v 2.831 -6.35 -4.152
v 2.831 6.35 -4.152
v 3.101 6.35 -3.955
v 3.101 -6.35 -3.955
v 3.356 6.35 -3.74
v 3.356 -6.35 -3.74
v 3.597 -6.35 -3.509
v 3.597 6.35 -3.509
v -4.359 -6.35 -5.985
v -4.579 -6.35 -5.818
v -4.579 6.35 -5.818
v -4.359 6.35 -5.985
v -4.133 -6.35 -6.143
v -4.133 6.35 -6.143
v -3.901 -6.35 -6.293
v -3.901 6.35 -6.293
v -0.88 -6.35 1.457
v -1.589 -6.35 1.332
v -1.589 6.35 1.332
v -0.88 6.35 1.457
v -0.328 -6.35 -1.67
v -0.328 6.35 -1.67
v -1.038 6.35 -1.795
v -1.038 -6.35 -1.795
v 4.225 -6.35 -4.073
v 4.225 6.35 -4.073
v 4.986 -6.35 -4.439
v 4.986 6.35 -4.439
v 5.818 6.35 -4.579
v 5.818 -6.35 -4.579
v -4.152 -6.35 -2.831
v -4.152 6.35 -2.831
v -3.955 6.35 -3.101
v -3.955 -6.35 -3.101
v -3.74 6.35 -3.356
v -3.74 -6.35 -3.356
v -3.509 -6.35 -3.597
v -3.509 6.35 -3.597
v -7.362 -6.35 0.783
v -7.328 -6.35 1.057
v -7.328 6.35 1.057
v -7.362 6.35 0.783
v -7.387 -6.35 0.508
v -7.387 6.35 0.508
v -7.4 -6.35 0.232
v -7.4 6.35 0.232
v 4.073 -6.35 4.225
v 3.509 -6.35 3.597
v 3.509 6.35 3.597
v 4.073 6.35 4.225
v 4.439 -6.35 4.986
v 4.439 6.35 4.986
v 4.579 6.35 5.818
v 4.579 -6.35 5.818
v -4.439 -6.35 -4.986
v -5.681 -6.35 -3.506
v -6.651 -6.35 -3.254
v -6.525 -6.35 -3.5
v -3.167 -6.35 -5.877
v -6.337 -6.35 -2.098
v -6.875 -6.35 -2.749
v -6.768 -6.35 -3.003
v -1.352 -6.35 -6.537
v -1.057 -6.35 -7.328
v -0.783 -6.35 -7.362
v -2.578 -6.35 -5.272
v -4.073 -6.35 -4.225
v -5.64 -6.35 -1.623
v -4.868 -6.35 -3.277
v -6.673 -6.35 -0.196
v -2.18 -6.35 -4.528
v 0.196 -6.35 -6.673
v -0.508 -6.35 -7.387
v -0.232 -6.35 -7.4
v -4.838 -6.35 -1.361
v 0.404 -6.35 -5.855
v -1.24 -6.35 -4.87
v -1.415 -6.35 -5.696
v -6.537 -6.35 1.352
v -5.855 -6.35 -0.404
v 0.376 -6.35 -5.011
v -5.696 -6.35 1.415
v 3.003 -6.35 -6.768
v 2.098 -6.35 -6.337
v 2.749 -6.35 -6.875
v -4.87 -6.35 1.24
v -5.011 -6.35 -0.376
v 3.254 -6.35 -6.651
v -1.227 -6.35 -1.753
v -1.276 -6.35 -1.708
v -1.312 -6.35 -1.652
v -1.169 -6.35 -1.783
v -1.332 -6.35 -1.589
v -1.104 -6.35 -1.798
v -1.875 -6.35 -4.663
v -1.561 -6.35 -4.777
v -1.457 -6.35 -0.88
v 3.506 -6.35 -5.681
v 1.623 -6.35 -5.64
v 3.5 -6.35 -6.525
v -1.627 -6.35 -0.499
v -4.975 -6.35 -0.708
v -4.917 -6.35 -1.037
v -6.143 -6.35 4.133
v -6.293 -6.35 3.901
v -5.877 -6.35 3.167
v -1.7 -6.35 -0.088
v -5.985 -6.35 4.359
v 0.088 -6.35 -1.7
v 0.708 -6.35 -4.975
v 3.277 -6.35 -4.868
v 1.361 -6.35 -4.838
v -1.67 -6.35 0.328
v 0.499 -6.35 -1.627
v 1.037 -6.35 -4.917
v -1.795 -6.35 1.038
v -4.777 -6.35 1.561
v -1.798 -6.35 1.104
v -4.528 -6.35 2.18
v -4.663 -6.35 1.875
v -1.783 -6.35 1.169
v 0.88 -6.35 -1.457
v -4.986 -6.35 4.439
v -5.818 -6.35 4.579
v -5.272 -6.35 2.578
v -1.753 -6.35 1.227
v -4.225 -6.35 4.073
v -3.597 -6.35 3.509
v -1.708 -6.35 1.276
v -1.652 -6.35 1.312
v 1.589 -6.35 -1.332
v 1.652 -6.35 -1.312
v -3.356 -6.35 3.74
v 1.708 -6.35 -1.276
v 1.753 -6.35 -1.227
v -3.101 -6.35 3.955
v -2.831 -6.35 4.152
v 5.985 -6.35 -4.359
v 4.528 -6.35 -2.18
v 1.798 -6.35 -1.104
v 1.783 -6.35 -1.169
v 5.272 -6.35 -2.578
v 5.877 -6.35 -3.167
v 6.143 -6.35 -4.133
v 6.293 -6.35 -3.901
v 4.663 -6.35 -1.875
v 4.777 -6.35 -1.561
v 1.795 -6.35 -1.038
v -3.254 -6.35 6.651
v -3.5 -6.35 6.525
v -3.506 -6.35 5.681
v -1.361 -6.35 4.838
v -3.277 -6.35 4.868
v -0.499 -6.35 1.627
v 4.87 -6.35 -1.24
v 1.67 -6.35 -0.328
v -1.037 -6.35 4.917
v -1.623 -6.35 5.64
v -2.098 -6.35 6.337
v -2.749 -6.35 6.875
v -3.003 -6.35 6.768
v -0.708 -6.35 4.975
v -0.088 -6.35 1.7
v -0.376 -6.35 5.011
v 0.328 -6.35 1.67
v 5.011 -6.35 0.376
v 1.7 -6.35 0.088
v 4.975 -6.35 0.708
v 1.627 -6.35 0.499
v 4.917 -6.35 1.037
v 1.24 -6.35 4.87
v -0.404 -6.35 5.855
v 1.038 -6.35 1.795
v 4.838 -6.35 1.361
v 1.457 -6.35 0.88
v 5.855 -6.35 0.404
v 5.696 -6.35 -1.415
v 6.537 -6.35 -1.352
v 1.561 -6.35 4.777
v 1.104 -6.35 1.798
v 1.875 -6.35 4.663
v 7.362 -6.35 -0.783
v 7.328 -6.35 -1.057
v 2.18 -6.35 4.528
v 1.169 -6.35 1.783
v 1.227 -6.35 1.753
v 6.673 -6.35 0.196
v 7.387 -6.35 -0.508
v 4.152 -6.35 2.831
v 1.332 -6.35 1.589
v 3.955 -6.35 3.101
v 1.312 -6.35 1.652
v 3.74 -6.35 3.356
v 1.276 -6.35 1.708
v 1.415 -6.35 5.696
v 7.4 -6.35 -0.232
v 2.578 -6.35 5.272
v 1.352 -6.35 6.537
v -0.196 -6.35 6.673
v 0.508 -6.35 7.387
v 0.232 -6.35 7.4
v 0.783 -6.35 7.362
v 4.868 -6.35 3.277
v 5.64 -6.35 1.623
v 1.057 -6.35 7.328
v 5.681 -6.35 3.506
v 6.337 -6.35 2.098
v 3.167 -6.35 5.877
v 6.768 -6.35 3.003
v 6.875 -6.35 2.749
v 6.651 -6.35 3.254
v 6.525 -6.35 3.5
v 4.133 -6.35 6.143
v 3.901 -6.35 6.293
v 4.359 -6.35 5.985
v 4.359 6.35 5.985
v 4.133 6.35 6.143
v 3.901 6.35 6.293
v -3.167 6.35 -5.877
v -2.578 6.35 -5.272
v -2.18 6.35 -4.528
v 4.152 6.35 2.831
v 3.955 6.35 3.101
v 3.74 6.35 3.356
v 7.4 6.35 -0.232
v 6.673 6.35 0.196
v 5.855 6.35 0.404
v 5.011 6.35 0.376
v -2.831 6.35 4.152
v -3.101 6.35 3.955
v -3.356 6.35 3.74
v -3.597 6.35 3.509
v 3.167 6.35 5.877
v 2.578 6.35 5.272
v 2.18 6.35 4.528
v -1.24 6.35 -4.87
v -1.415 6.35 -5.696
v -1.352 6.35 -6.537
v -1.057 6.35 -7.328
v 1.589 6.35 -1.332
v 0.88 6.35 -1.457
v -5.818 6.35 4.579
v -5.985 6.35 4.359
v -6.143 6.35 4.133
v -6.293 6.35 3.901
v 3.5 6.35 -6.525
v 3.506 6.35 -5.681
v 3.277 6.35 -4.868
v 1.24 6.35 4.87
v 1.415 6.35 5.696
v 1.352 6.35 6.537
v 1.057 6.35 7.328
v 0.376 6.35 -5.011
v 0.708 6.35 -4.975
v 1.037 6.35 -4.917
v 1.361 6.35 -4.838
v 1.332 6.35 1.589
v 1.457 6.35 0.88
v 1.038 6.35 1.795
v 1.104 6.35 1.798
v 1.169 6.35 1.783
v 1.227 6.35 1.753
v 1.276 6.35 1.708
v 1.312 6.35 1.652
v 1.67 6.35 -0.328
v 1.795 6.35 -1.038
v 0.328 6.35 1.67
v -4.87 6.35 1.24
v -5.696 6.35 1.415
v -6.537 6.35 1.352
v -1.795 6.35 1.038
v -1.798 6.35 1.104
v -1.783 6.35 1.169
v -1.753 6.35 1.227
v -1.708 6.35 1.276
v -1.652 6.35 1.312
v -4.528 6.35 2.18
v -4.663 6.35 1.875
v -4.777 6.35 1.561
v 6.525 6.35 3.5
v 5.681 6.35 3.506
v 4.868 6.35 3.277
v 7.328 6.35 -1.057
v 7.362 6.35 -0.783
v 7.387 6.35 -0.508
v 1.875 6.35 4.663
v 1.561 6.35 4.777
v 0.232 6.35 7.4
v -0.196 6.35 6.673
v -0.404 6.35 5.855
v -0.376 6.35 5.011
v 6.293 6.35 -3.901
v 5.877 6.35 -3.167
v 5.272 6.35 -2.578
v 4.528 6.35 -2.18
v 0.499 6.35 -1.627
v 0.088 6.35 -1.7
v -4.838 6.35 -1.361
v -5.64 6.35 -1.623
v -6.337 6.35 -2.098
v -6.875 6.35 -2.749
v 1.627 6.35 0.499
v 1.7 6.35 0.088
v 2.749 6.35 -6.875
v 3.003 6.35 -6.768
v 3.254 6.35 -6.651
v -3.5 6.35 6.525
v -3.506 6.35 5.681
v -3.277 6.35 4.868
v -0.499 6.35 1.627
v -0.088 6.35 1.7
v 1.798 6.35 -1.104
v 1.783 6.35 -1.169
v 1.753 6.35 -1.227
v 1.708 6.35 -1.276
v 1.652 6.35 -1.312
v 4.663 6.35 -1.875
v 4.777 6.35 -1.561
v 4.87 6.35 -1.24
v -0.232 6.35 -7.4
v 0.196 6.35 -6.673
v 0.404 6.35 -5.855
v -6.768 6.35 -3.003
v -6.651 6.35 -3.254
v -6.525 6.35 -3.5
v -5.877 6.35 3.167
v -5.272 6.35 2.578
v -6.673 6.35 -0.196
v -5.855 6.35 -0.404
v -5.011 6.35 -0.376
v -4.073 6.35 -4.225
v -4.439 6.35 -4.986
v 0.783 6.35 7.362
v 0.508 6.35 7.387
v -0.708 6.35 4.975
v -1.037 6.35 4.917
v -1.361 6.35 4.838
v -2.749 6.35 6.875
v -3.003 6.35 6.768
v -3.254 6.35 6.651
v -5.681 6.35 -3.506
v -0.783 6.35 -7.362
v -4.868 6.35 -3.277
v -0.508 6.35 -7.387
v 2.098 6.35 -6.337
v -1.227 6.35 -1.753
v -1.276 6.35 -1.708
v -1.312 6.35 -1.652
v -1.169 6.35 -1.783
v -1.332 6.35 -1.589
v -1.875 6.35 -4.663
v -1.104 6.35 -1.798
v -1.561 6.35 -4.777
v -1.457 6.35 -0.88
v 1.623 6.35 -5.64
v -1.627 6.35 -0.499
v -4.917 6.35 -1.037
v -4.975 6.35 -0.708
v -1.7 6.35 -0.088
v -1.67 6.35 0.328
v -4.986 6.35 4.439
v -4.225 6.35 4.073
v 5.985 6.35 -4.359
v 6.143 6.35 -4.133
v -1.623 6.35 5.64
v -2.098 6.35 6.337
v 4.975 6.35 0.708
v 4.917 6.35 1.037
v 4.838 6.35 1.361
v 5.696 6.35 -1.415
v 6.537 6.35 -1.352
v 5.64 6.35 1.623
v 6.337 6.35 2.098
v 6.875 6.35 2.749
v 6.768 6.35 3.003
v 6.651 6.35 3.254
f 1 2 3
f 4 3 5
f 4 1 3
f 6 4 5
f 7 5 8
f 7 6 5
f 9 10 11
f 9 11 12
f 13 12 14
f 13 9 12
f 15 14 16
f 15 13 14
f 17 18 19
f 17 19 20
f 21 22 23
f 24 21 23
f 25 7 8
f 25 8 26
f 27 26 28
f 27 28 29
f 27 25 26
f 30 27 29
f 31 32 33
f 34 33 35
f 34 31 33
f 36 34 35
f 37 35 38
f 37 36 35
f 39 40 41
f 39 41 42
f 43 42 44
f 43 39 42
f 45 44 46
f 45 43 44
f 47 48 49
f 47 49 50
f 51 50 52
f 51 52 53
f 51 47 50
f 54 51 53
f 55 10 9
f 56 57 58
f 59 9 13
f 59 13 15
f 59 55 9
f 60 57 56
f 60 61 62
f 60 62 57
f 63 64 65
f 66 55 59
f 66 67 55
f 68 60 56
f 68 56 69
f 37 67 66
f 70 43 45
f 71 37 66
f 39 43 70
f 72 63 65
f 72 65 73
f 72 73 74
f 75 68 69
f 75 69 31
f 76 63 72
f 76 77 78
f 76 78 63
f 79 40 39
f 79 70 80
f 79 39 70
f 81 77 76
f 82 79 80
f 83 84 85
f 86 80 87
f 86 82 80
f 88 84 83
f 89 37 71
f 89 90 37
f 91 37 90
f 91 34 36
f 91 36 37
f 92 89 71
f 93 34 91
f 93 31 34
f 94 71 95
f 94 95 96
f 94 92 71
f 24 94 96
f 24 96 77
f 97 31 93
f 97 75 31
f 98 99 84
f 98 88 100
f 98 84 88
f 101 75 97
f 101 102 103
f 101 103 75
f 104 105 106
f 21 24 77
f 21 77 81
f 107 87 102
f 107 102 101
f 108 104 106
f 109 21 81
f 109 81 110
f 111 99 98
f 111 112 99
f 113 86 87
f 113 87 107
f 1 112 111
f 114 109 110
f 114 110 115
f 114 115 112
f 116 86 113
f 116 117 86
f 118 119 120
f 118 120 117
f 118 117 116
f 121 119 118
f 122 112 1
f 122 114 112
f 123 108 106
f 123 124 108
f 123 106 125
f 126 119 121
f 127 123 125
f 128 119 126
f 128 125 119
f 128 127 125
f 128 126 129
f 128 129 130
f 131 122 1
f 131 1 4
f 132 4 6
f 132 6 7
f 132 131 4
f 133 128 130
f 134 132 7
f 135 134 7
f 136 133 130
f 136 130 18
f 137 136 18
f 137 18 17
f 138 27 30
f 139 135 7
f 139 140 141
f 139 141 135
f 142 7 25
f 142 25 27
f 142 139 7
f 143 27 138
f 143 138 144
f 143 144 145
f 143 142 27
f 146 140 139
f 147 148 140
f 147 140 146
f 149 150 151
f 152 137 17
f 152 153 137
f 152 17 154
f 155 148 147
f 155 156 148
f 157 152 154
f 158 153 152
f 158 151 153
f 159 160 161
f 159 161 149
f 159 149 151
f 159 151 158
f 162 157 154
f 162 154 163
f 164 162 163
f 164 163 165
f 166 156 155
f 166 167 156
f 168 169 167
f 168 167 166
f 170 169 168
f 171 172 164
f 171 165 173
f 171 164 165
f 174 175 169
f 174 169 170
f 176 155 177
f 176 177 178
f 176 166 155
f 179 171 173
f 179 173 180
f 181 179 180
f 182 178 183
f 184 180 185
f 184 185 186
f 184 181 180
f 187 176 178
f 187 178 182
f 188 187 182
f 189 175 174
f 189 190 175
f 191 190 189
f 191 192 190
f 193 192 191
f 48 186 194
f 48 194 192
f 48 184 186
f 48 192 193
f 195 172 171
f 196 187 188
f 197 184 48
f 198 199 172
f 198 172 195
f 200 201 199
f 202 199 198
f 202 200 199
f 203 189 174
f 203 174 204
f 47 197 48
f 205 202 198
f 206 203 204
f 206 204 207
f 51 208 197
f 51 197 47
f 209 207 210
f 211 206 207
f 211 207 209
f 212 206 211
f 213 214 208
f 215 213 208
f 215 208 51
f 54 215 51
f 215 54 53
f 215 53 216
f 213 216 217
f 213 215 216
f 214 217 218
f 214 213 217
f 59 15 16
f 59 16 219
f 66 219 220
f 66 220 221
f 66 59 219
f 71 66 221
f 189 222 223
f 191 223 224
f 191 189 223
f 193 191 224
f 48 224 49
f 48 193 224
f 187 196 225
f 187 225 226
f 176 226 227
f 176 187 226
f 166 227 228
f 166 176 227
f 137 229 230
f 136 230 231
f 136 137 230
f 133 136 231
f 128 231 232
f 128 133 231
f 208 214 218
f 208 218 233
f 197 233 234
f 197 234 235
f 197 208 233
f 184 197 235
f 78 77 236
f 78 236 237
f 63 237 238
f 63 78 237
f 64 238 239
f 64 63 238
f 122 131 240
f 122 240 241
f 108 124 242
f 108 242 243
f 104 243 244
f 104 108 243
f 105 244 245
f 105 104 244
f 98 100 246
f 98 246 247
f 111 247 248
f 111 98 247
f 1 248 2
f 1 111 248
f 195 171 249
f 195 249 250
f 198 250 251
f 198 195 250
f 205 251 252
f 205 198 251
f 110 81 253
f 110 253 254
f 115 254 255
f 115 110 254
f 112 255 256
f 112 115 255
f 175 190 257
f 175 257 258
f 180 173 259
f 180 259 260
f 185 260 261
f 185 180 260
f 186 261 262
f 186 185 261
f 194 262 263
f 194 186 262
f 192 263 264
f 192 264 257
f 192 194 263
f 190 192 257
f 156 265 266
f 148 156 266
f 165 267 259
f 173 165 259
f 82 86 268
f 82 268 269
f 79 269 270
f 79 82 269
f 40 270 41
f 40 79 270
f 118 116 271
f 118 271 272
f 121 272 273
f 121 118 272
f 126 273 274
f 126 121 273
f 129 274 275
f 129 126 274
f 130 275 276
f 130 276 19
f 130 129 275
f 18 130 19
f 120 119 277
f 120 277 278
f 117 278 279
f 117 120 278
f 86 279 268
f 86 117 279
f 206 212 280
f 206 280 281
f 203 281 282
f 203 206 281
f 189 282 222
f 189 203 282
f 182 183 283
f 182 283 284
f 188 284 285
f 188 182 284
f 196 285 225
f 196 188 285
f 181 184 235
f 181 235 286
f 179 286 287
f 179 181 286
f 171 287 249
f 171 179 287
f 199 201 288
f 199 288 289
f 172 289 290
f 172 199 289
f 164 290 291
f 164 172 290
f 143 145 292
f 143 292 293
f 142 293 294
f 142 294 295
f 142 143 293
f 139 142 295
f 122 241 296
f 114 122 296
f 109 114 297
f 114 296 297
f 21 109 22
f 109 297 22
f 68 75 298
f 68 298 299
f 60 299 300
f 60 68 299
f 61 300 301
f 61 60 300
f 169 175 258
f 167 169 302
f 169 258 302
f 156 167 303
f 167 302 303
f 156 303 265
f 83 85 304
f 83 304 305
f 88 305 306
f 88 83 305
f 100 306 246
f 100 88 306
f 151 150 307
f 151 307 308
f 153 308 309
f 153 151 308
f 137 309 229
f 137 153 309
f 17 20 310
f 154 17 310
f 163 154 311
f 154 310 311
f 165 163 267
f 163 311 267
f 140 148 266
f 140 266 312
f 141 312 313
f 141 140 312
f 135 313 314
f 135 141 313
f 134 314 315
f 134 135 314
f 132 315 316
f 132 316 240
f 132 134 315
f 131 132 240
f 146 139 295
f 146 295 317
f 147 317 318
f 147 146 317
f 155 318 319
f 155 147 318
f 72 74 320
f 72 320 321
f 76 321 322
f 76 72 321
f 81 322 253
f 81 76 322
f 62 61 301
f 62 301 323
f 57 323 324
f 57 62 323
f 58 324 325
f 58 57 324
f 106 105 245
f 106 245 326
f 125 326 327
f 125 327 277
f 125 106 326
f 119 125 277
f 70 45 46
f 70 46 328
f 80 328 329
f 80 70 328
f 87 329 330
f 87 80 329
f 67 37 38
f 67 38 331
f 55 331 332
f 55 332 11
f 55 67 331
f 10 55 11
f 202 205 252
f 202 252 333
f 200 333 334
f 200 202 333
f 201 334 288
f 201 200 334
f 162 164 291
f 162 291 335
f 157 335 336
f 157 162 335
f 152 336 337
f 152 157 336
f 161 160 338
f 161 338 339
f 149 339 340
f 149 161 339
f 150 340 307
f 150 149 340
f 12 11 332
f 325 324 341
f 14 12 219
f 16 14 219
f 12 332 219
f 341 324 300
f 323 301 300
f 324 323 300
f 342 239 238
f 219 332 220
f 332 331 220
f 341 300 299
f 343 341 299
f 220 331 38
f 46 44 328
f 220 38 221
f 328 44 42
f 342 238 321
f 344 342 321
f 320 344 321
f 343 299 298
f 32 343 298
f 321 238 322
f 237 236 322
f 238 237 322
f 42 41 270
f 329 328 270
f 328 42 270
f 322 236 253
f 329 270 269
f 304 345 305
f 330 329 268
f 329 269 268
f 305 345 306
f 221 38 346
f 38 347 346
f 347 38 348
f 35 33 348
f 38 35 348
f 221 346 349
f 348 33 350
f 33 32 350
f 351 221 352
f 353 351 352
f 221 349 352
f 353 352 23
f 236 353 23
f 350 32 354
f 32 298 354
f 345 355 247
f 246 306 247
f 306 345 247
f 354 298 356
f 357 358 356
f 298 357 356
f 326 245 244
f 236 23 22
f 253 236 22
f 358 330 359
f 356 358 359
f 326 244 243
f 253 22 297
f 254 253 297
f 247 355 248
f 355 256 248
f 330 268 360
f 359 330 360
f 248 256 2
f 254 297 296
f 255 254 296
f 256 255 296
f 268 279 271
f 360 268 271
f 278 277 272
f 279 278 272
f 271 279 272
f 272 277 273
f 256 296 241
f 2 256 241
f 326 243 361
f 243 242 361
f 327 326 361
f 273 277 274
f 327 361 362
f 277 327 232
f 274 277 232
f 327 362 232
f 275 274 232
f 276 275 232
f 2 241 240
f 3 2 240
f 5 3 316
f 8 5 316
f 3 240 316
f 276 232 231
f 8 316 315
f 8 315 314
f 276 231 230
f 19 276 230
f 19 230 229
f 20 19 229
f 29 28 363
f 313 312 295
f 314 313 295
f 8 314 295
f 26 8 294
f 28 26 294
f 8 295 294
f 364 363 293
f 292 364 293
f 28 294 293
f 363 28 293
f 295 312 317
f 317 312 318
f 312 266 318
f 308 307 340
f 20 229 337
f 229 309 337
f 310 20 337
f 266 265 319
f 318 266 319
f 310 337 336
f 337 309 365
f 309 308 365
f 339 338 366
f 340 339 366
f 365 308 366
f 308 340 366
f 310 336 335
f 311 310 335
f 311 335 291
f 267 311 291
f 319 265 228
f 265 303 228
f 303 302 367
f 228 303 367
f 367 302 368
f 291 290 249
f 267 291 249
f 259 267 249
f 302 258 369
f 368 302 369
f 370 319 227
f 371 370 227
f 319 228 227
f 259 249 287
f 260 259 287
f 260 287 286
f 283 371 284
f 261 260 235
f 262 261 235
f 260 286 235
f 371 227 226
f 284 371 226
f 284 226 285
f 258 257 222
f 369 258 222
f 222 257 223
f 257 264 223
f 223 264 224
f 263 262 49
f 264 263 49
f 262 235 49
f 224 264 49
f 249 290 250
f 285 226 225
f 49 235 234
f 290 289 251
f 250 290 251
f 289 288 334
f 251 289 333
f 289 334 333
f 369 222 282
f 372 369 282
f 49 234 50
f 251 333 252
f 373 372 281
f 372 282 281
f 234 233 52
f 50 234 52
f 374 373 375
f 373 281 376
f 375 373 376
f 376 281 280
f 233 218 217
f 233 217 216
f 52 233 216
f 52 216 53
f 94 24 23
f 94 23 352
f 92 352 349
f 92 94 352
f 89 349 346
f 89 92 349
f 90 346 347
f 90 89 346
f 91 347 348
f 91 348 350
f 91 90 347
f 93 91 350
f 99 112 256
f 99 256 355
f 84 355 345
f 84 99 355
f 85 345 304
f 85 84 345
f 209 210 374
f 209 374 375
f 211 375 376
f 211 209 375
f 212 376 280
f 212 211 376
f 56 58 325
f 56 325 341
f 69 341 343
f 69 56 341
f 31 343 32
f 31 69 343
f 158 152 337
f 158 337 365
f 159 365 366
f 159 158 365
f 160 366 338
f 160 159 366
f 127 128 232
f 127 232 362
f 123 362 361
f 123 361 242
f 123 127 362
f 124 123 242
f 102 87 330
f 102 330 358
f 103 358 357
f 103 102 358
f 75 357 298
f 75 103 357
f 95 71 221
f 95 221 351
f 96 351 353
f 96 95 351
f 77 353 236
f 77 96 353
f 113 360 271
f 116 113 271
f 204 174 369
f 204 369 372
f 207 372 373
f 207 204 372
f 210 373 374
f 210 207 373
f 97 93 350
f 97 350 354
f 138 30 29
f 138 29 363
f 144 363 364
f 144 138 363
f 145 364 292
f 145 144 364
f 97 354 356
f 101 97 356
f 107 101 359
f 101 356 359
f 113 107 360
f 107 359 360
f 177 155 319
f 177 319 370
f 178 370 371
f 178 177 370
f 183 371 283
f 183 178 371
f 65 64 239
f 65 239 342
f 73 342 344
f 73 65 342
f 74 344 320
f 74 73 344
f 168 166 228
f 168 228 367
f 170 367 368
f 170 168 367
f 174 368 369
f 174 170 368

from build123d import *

# Parameters (mm, degrees)
BOSS_EXTRUDE1_DEPTH = 12.7
SKETCH2_R           = 1.7018
CUT_EXTRUDE1_DEPTH  = 56.896


with BuildPart() as part:
    # Sketch1 → Boss-Extrude1 (new body)
    with BuildSketch(Plane.XZ.offset(6.35)):
        with BuildLine():
            ThreePointArc((3.900741532, 6.293125734), (2.850773823, 5.595435975), (2.180140266, 4.527983952))
            ThreePointArc((2.180140266, 4.527983952), (1.71882223, 4.722425266), (1.240447645, 4.870004095))
            ThreePointArc((1.240447645, 4.870004095), (1.41285747, 6.118794727), (1.057001873, 7.328162323))
            ThreePointArc((1.057001873, 7.328162323), (0.645301119, 7.375825545), (0.231578393, 7.400377521))
            ThreePointArc((0.231578393, 7.400377521), (-0.328875436, 6.271176611), (-0.375935122, 5.011419263))
            ThreePointArc((-0.375935122, 5.011419263), (-0.872668917, 4.949151363), (-1.360742875, 4.837771086))
            ThreePointArc((-1.360742875, 4.837771086), (-1.835826903, 6.005460409), (-2.748690687, 6.874875672))
            ThreePointArc((-2.748690687, 6.874875672), (-3.12906561, 6.710302855), (-3.499635989, 6.524704127))
            ThreePointArc((-3.499635989, 6.524704127), (-3.420402788, 5.266560539), (-2.831278997, 4.15204883))
            ThreePointArc((-2.831278997, 4.15204883), (-3.230329132, 3.849756349), (-3.597323441, 3.509261221))
            ThreePointArc((-3.597323441, 3.509261221), (-4.592602939, 4.282967824), (-5.817873798, 4.579471636))
            ThreePointArc((-5.817873798, 4.579471636), (-6.065001736, 4.246759935), (-6.293125734, 3.900741532))
            ThreePointArc((-6.293125734, 3.900741532), (-5.595435975, 2.850773823), (-4.527983952, 2.180140266))
            ThreePointArc((-4.527983952, 2.180140266), (-4.722425266, 1.71882223), (-4.870004095, 1.240447645))
            ThreePointArc((-4.870004095, 1.240447645), (-6.118794727, 1.41285747), (-7.328162323, 1.057001873))
            ThreePointArc((-7.328162323, 1.057001873), (-7.375825545, 0.645301119), (-7.400377521, 0.231578393))
            ThreePointArc((-7.400377521, 0.231578393), (-6.271176611, -0.328875436), (-5.011419263, -0.375935122))
            ThreePointArc((-5.011419263, -0.375935122), (-4.949151363, -0.872668917), (-4.837771086, -1.360742875))
            ThreePointArc((-4.837771086, -1.360742875), (-6.005460409, -1.835826903), (-6.874875672, -2.748690687))
            ThreePointArc((-6.874875672, -2.748690687), (-6.710302855, -3.12906561), (-6.524704127, -3.499635989))
            ThreePointArc((-6.524704127, -3.499635989), (-5.266560539, -3.420402788), (-4.15204883, -2.831278997))
            ThreePointArc((-4.15204883, -2.831278997), (-3.849756349, -3.230329132), (-3.509261221, -3.597323441))
            ThreePointArc((-3.509261221, -3.597323441), (-4.282967824, -4.592602939), (-4.579471636, -5.817873798))
            ThreePointArc((-4.579471636, -5.817873798), (-4.246759935, -6.065001736), (-3.900741532, -6.293125734))
            ThreePointArc((-3.900741532, -6.293125734), (-2.850773823, -5.595435975), (-2.180140266, -4.527983952))
            ThreePointArc((-2.180140266, -4.527983952), (-1.71882223, -4.722425266), (-1.240447645, -4.870004095))
            ThreePointArc((-1.240447645, -4.870004095), (-1.41285747, -6.118794727), (-1.057001873, -7.328162323))
            ThreePointArc((-1.057001873, -7.328162323), (-0.645301119, -7.375825545), (-0.231578393, -7.400377521))
            ThreePointArc((-0.231578393, -7.400377521), (0.328875436, -6.271176611), (0.375935122, -5.011419263))
            ThreePointArc((0.375935122, -5.011419263), (0.872668917, -4.949151363), (1.360742875, -4.837771086))
            ThreePointArc((1.360742875, -4.837771086), (1.835826903, -6.005460409), (2.748690687, -6.874875672))
            ThreePointArc((2.748690687, -6.874875672), (3.12906561, -6.710302855), (3.499635989, -6.524704127))
            ThreePointArc((3.499635989, -6.524704127), (3.420402788, -5.266560539), (2.831278997, -4.15204883))
            ThreePointArc((2.831278997, -4.15204883), (3.230329132, -3.849756349), (3.597323441, -3.509261221))
            ThreePointArc((3.597323441, -3.509261221), (4.592602939, -4.282967824), (5.817873798, -4.579471636))
            ThreePointArc((5.817873798, -4.579471636), (6.065001736, -4.246759935), (6.293125734, -3.900741532))
            ThreePointArc((6.293125734, -3.900741532), (5.595435975, -2.850773823), (4.527983952, -2.180140266))
            ThreePointArc((4.527983952, -2.180140266), (4.722425266, -1.71882223), (4.870004095, -1.240447645))
            ThreePointArc((4.870004095, -1.240447645), (6.118794727, -1.41285747), (7.328162323, -1.057001873))
            ThreePointArc((7.328162323, -1.057001873), (7.375825545, -0.645301119), (7.400377521, -0.231578393))
            ThreePointArc((7.400377521, -0.231578393), (6.271176611, 0.328875436), (5.011419263, 0.375935122))
            ThreePointArc((5.011419263, 0.375935122), (4.949151363, 0.872668917), (4.837771086, 1.360742875))
            ThreePointArc((4.837771086, 1.360742875), (6.005460409, 1.835826903), (6.874875672, 2.748690687))
            ThreePointArc((6.874875672, 2.748690687), (6.710302855, 3.12906561), (6.524704127, 3.499635989))
            ThreePointArc((6.524704127, 3.499635989), (5.266560539, 3.420402788), (4.15204883, 2.831278997))
            ThreePointArc((4.15204883, 2.831278997), (3.849756349, 3.230329132), (3.509261221, 3.597323441))
            ThreePointArc((3.509261221, 3.597323441), (4.282967824, 4.592602939), (4.579471636, 5.817873798))
            ThreePointArc((4.579471636, 5.817873798), (4.246759935, 6.065001736), (3.900741532, 6.293125734))
        make_face()
        with BuildLine():
            Line((1.331822463, 1.588907621), (1.794942153, -1.037574657))
            ThreePointArc((1.794942153, -1.037574657), (1.752865603, -1.227369709), (1.588907621, -1.331822463))
            Line((1.588907621, -1.331822463), (-1.037574657, -1.794942153))
            ThreePointArc((-1.037574657, -1.794942153), (-1.227369709, -1.752865603), (-1.331822463, -1.588907621))
            Line((-1.331822463, -1.588907621), (-1.794942153, 1.037574657))
            ThreePointArc((-1.794942153, 1.037574657), (-1.752865603, 1.227369709), (-1.588907621, 1.331822463))
            Line((-1.588907621, 1.331822463), (1.037574657, 1.794942153))
            ThreePointArc((1.037574657, 1.794942153), (1.227369709, 1.752865603), (1.331822463, 1.588907621))
        make_face(mode=Mode.SUBTRACT)
    extrude(amount=-BOSS_EXTRUDE1_DEPTH)

    # Sketch2 → Cut-Extrude1 (cut)
    with BuildSketch(Plane(origin=(0, 6.35, 0), x_dir=(1, 0, 0), z_dir=(0, 1, 0))):
        Circle(SKETCH2_R)
    extrude(amount=-CUT_EXTRUDE1_DEPTH, mode=Mode.SUBTRACT)


solid = part.part
